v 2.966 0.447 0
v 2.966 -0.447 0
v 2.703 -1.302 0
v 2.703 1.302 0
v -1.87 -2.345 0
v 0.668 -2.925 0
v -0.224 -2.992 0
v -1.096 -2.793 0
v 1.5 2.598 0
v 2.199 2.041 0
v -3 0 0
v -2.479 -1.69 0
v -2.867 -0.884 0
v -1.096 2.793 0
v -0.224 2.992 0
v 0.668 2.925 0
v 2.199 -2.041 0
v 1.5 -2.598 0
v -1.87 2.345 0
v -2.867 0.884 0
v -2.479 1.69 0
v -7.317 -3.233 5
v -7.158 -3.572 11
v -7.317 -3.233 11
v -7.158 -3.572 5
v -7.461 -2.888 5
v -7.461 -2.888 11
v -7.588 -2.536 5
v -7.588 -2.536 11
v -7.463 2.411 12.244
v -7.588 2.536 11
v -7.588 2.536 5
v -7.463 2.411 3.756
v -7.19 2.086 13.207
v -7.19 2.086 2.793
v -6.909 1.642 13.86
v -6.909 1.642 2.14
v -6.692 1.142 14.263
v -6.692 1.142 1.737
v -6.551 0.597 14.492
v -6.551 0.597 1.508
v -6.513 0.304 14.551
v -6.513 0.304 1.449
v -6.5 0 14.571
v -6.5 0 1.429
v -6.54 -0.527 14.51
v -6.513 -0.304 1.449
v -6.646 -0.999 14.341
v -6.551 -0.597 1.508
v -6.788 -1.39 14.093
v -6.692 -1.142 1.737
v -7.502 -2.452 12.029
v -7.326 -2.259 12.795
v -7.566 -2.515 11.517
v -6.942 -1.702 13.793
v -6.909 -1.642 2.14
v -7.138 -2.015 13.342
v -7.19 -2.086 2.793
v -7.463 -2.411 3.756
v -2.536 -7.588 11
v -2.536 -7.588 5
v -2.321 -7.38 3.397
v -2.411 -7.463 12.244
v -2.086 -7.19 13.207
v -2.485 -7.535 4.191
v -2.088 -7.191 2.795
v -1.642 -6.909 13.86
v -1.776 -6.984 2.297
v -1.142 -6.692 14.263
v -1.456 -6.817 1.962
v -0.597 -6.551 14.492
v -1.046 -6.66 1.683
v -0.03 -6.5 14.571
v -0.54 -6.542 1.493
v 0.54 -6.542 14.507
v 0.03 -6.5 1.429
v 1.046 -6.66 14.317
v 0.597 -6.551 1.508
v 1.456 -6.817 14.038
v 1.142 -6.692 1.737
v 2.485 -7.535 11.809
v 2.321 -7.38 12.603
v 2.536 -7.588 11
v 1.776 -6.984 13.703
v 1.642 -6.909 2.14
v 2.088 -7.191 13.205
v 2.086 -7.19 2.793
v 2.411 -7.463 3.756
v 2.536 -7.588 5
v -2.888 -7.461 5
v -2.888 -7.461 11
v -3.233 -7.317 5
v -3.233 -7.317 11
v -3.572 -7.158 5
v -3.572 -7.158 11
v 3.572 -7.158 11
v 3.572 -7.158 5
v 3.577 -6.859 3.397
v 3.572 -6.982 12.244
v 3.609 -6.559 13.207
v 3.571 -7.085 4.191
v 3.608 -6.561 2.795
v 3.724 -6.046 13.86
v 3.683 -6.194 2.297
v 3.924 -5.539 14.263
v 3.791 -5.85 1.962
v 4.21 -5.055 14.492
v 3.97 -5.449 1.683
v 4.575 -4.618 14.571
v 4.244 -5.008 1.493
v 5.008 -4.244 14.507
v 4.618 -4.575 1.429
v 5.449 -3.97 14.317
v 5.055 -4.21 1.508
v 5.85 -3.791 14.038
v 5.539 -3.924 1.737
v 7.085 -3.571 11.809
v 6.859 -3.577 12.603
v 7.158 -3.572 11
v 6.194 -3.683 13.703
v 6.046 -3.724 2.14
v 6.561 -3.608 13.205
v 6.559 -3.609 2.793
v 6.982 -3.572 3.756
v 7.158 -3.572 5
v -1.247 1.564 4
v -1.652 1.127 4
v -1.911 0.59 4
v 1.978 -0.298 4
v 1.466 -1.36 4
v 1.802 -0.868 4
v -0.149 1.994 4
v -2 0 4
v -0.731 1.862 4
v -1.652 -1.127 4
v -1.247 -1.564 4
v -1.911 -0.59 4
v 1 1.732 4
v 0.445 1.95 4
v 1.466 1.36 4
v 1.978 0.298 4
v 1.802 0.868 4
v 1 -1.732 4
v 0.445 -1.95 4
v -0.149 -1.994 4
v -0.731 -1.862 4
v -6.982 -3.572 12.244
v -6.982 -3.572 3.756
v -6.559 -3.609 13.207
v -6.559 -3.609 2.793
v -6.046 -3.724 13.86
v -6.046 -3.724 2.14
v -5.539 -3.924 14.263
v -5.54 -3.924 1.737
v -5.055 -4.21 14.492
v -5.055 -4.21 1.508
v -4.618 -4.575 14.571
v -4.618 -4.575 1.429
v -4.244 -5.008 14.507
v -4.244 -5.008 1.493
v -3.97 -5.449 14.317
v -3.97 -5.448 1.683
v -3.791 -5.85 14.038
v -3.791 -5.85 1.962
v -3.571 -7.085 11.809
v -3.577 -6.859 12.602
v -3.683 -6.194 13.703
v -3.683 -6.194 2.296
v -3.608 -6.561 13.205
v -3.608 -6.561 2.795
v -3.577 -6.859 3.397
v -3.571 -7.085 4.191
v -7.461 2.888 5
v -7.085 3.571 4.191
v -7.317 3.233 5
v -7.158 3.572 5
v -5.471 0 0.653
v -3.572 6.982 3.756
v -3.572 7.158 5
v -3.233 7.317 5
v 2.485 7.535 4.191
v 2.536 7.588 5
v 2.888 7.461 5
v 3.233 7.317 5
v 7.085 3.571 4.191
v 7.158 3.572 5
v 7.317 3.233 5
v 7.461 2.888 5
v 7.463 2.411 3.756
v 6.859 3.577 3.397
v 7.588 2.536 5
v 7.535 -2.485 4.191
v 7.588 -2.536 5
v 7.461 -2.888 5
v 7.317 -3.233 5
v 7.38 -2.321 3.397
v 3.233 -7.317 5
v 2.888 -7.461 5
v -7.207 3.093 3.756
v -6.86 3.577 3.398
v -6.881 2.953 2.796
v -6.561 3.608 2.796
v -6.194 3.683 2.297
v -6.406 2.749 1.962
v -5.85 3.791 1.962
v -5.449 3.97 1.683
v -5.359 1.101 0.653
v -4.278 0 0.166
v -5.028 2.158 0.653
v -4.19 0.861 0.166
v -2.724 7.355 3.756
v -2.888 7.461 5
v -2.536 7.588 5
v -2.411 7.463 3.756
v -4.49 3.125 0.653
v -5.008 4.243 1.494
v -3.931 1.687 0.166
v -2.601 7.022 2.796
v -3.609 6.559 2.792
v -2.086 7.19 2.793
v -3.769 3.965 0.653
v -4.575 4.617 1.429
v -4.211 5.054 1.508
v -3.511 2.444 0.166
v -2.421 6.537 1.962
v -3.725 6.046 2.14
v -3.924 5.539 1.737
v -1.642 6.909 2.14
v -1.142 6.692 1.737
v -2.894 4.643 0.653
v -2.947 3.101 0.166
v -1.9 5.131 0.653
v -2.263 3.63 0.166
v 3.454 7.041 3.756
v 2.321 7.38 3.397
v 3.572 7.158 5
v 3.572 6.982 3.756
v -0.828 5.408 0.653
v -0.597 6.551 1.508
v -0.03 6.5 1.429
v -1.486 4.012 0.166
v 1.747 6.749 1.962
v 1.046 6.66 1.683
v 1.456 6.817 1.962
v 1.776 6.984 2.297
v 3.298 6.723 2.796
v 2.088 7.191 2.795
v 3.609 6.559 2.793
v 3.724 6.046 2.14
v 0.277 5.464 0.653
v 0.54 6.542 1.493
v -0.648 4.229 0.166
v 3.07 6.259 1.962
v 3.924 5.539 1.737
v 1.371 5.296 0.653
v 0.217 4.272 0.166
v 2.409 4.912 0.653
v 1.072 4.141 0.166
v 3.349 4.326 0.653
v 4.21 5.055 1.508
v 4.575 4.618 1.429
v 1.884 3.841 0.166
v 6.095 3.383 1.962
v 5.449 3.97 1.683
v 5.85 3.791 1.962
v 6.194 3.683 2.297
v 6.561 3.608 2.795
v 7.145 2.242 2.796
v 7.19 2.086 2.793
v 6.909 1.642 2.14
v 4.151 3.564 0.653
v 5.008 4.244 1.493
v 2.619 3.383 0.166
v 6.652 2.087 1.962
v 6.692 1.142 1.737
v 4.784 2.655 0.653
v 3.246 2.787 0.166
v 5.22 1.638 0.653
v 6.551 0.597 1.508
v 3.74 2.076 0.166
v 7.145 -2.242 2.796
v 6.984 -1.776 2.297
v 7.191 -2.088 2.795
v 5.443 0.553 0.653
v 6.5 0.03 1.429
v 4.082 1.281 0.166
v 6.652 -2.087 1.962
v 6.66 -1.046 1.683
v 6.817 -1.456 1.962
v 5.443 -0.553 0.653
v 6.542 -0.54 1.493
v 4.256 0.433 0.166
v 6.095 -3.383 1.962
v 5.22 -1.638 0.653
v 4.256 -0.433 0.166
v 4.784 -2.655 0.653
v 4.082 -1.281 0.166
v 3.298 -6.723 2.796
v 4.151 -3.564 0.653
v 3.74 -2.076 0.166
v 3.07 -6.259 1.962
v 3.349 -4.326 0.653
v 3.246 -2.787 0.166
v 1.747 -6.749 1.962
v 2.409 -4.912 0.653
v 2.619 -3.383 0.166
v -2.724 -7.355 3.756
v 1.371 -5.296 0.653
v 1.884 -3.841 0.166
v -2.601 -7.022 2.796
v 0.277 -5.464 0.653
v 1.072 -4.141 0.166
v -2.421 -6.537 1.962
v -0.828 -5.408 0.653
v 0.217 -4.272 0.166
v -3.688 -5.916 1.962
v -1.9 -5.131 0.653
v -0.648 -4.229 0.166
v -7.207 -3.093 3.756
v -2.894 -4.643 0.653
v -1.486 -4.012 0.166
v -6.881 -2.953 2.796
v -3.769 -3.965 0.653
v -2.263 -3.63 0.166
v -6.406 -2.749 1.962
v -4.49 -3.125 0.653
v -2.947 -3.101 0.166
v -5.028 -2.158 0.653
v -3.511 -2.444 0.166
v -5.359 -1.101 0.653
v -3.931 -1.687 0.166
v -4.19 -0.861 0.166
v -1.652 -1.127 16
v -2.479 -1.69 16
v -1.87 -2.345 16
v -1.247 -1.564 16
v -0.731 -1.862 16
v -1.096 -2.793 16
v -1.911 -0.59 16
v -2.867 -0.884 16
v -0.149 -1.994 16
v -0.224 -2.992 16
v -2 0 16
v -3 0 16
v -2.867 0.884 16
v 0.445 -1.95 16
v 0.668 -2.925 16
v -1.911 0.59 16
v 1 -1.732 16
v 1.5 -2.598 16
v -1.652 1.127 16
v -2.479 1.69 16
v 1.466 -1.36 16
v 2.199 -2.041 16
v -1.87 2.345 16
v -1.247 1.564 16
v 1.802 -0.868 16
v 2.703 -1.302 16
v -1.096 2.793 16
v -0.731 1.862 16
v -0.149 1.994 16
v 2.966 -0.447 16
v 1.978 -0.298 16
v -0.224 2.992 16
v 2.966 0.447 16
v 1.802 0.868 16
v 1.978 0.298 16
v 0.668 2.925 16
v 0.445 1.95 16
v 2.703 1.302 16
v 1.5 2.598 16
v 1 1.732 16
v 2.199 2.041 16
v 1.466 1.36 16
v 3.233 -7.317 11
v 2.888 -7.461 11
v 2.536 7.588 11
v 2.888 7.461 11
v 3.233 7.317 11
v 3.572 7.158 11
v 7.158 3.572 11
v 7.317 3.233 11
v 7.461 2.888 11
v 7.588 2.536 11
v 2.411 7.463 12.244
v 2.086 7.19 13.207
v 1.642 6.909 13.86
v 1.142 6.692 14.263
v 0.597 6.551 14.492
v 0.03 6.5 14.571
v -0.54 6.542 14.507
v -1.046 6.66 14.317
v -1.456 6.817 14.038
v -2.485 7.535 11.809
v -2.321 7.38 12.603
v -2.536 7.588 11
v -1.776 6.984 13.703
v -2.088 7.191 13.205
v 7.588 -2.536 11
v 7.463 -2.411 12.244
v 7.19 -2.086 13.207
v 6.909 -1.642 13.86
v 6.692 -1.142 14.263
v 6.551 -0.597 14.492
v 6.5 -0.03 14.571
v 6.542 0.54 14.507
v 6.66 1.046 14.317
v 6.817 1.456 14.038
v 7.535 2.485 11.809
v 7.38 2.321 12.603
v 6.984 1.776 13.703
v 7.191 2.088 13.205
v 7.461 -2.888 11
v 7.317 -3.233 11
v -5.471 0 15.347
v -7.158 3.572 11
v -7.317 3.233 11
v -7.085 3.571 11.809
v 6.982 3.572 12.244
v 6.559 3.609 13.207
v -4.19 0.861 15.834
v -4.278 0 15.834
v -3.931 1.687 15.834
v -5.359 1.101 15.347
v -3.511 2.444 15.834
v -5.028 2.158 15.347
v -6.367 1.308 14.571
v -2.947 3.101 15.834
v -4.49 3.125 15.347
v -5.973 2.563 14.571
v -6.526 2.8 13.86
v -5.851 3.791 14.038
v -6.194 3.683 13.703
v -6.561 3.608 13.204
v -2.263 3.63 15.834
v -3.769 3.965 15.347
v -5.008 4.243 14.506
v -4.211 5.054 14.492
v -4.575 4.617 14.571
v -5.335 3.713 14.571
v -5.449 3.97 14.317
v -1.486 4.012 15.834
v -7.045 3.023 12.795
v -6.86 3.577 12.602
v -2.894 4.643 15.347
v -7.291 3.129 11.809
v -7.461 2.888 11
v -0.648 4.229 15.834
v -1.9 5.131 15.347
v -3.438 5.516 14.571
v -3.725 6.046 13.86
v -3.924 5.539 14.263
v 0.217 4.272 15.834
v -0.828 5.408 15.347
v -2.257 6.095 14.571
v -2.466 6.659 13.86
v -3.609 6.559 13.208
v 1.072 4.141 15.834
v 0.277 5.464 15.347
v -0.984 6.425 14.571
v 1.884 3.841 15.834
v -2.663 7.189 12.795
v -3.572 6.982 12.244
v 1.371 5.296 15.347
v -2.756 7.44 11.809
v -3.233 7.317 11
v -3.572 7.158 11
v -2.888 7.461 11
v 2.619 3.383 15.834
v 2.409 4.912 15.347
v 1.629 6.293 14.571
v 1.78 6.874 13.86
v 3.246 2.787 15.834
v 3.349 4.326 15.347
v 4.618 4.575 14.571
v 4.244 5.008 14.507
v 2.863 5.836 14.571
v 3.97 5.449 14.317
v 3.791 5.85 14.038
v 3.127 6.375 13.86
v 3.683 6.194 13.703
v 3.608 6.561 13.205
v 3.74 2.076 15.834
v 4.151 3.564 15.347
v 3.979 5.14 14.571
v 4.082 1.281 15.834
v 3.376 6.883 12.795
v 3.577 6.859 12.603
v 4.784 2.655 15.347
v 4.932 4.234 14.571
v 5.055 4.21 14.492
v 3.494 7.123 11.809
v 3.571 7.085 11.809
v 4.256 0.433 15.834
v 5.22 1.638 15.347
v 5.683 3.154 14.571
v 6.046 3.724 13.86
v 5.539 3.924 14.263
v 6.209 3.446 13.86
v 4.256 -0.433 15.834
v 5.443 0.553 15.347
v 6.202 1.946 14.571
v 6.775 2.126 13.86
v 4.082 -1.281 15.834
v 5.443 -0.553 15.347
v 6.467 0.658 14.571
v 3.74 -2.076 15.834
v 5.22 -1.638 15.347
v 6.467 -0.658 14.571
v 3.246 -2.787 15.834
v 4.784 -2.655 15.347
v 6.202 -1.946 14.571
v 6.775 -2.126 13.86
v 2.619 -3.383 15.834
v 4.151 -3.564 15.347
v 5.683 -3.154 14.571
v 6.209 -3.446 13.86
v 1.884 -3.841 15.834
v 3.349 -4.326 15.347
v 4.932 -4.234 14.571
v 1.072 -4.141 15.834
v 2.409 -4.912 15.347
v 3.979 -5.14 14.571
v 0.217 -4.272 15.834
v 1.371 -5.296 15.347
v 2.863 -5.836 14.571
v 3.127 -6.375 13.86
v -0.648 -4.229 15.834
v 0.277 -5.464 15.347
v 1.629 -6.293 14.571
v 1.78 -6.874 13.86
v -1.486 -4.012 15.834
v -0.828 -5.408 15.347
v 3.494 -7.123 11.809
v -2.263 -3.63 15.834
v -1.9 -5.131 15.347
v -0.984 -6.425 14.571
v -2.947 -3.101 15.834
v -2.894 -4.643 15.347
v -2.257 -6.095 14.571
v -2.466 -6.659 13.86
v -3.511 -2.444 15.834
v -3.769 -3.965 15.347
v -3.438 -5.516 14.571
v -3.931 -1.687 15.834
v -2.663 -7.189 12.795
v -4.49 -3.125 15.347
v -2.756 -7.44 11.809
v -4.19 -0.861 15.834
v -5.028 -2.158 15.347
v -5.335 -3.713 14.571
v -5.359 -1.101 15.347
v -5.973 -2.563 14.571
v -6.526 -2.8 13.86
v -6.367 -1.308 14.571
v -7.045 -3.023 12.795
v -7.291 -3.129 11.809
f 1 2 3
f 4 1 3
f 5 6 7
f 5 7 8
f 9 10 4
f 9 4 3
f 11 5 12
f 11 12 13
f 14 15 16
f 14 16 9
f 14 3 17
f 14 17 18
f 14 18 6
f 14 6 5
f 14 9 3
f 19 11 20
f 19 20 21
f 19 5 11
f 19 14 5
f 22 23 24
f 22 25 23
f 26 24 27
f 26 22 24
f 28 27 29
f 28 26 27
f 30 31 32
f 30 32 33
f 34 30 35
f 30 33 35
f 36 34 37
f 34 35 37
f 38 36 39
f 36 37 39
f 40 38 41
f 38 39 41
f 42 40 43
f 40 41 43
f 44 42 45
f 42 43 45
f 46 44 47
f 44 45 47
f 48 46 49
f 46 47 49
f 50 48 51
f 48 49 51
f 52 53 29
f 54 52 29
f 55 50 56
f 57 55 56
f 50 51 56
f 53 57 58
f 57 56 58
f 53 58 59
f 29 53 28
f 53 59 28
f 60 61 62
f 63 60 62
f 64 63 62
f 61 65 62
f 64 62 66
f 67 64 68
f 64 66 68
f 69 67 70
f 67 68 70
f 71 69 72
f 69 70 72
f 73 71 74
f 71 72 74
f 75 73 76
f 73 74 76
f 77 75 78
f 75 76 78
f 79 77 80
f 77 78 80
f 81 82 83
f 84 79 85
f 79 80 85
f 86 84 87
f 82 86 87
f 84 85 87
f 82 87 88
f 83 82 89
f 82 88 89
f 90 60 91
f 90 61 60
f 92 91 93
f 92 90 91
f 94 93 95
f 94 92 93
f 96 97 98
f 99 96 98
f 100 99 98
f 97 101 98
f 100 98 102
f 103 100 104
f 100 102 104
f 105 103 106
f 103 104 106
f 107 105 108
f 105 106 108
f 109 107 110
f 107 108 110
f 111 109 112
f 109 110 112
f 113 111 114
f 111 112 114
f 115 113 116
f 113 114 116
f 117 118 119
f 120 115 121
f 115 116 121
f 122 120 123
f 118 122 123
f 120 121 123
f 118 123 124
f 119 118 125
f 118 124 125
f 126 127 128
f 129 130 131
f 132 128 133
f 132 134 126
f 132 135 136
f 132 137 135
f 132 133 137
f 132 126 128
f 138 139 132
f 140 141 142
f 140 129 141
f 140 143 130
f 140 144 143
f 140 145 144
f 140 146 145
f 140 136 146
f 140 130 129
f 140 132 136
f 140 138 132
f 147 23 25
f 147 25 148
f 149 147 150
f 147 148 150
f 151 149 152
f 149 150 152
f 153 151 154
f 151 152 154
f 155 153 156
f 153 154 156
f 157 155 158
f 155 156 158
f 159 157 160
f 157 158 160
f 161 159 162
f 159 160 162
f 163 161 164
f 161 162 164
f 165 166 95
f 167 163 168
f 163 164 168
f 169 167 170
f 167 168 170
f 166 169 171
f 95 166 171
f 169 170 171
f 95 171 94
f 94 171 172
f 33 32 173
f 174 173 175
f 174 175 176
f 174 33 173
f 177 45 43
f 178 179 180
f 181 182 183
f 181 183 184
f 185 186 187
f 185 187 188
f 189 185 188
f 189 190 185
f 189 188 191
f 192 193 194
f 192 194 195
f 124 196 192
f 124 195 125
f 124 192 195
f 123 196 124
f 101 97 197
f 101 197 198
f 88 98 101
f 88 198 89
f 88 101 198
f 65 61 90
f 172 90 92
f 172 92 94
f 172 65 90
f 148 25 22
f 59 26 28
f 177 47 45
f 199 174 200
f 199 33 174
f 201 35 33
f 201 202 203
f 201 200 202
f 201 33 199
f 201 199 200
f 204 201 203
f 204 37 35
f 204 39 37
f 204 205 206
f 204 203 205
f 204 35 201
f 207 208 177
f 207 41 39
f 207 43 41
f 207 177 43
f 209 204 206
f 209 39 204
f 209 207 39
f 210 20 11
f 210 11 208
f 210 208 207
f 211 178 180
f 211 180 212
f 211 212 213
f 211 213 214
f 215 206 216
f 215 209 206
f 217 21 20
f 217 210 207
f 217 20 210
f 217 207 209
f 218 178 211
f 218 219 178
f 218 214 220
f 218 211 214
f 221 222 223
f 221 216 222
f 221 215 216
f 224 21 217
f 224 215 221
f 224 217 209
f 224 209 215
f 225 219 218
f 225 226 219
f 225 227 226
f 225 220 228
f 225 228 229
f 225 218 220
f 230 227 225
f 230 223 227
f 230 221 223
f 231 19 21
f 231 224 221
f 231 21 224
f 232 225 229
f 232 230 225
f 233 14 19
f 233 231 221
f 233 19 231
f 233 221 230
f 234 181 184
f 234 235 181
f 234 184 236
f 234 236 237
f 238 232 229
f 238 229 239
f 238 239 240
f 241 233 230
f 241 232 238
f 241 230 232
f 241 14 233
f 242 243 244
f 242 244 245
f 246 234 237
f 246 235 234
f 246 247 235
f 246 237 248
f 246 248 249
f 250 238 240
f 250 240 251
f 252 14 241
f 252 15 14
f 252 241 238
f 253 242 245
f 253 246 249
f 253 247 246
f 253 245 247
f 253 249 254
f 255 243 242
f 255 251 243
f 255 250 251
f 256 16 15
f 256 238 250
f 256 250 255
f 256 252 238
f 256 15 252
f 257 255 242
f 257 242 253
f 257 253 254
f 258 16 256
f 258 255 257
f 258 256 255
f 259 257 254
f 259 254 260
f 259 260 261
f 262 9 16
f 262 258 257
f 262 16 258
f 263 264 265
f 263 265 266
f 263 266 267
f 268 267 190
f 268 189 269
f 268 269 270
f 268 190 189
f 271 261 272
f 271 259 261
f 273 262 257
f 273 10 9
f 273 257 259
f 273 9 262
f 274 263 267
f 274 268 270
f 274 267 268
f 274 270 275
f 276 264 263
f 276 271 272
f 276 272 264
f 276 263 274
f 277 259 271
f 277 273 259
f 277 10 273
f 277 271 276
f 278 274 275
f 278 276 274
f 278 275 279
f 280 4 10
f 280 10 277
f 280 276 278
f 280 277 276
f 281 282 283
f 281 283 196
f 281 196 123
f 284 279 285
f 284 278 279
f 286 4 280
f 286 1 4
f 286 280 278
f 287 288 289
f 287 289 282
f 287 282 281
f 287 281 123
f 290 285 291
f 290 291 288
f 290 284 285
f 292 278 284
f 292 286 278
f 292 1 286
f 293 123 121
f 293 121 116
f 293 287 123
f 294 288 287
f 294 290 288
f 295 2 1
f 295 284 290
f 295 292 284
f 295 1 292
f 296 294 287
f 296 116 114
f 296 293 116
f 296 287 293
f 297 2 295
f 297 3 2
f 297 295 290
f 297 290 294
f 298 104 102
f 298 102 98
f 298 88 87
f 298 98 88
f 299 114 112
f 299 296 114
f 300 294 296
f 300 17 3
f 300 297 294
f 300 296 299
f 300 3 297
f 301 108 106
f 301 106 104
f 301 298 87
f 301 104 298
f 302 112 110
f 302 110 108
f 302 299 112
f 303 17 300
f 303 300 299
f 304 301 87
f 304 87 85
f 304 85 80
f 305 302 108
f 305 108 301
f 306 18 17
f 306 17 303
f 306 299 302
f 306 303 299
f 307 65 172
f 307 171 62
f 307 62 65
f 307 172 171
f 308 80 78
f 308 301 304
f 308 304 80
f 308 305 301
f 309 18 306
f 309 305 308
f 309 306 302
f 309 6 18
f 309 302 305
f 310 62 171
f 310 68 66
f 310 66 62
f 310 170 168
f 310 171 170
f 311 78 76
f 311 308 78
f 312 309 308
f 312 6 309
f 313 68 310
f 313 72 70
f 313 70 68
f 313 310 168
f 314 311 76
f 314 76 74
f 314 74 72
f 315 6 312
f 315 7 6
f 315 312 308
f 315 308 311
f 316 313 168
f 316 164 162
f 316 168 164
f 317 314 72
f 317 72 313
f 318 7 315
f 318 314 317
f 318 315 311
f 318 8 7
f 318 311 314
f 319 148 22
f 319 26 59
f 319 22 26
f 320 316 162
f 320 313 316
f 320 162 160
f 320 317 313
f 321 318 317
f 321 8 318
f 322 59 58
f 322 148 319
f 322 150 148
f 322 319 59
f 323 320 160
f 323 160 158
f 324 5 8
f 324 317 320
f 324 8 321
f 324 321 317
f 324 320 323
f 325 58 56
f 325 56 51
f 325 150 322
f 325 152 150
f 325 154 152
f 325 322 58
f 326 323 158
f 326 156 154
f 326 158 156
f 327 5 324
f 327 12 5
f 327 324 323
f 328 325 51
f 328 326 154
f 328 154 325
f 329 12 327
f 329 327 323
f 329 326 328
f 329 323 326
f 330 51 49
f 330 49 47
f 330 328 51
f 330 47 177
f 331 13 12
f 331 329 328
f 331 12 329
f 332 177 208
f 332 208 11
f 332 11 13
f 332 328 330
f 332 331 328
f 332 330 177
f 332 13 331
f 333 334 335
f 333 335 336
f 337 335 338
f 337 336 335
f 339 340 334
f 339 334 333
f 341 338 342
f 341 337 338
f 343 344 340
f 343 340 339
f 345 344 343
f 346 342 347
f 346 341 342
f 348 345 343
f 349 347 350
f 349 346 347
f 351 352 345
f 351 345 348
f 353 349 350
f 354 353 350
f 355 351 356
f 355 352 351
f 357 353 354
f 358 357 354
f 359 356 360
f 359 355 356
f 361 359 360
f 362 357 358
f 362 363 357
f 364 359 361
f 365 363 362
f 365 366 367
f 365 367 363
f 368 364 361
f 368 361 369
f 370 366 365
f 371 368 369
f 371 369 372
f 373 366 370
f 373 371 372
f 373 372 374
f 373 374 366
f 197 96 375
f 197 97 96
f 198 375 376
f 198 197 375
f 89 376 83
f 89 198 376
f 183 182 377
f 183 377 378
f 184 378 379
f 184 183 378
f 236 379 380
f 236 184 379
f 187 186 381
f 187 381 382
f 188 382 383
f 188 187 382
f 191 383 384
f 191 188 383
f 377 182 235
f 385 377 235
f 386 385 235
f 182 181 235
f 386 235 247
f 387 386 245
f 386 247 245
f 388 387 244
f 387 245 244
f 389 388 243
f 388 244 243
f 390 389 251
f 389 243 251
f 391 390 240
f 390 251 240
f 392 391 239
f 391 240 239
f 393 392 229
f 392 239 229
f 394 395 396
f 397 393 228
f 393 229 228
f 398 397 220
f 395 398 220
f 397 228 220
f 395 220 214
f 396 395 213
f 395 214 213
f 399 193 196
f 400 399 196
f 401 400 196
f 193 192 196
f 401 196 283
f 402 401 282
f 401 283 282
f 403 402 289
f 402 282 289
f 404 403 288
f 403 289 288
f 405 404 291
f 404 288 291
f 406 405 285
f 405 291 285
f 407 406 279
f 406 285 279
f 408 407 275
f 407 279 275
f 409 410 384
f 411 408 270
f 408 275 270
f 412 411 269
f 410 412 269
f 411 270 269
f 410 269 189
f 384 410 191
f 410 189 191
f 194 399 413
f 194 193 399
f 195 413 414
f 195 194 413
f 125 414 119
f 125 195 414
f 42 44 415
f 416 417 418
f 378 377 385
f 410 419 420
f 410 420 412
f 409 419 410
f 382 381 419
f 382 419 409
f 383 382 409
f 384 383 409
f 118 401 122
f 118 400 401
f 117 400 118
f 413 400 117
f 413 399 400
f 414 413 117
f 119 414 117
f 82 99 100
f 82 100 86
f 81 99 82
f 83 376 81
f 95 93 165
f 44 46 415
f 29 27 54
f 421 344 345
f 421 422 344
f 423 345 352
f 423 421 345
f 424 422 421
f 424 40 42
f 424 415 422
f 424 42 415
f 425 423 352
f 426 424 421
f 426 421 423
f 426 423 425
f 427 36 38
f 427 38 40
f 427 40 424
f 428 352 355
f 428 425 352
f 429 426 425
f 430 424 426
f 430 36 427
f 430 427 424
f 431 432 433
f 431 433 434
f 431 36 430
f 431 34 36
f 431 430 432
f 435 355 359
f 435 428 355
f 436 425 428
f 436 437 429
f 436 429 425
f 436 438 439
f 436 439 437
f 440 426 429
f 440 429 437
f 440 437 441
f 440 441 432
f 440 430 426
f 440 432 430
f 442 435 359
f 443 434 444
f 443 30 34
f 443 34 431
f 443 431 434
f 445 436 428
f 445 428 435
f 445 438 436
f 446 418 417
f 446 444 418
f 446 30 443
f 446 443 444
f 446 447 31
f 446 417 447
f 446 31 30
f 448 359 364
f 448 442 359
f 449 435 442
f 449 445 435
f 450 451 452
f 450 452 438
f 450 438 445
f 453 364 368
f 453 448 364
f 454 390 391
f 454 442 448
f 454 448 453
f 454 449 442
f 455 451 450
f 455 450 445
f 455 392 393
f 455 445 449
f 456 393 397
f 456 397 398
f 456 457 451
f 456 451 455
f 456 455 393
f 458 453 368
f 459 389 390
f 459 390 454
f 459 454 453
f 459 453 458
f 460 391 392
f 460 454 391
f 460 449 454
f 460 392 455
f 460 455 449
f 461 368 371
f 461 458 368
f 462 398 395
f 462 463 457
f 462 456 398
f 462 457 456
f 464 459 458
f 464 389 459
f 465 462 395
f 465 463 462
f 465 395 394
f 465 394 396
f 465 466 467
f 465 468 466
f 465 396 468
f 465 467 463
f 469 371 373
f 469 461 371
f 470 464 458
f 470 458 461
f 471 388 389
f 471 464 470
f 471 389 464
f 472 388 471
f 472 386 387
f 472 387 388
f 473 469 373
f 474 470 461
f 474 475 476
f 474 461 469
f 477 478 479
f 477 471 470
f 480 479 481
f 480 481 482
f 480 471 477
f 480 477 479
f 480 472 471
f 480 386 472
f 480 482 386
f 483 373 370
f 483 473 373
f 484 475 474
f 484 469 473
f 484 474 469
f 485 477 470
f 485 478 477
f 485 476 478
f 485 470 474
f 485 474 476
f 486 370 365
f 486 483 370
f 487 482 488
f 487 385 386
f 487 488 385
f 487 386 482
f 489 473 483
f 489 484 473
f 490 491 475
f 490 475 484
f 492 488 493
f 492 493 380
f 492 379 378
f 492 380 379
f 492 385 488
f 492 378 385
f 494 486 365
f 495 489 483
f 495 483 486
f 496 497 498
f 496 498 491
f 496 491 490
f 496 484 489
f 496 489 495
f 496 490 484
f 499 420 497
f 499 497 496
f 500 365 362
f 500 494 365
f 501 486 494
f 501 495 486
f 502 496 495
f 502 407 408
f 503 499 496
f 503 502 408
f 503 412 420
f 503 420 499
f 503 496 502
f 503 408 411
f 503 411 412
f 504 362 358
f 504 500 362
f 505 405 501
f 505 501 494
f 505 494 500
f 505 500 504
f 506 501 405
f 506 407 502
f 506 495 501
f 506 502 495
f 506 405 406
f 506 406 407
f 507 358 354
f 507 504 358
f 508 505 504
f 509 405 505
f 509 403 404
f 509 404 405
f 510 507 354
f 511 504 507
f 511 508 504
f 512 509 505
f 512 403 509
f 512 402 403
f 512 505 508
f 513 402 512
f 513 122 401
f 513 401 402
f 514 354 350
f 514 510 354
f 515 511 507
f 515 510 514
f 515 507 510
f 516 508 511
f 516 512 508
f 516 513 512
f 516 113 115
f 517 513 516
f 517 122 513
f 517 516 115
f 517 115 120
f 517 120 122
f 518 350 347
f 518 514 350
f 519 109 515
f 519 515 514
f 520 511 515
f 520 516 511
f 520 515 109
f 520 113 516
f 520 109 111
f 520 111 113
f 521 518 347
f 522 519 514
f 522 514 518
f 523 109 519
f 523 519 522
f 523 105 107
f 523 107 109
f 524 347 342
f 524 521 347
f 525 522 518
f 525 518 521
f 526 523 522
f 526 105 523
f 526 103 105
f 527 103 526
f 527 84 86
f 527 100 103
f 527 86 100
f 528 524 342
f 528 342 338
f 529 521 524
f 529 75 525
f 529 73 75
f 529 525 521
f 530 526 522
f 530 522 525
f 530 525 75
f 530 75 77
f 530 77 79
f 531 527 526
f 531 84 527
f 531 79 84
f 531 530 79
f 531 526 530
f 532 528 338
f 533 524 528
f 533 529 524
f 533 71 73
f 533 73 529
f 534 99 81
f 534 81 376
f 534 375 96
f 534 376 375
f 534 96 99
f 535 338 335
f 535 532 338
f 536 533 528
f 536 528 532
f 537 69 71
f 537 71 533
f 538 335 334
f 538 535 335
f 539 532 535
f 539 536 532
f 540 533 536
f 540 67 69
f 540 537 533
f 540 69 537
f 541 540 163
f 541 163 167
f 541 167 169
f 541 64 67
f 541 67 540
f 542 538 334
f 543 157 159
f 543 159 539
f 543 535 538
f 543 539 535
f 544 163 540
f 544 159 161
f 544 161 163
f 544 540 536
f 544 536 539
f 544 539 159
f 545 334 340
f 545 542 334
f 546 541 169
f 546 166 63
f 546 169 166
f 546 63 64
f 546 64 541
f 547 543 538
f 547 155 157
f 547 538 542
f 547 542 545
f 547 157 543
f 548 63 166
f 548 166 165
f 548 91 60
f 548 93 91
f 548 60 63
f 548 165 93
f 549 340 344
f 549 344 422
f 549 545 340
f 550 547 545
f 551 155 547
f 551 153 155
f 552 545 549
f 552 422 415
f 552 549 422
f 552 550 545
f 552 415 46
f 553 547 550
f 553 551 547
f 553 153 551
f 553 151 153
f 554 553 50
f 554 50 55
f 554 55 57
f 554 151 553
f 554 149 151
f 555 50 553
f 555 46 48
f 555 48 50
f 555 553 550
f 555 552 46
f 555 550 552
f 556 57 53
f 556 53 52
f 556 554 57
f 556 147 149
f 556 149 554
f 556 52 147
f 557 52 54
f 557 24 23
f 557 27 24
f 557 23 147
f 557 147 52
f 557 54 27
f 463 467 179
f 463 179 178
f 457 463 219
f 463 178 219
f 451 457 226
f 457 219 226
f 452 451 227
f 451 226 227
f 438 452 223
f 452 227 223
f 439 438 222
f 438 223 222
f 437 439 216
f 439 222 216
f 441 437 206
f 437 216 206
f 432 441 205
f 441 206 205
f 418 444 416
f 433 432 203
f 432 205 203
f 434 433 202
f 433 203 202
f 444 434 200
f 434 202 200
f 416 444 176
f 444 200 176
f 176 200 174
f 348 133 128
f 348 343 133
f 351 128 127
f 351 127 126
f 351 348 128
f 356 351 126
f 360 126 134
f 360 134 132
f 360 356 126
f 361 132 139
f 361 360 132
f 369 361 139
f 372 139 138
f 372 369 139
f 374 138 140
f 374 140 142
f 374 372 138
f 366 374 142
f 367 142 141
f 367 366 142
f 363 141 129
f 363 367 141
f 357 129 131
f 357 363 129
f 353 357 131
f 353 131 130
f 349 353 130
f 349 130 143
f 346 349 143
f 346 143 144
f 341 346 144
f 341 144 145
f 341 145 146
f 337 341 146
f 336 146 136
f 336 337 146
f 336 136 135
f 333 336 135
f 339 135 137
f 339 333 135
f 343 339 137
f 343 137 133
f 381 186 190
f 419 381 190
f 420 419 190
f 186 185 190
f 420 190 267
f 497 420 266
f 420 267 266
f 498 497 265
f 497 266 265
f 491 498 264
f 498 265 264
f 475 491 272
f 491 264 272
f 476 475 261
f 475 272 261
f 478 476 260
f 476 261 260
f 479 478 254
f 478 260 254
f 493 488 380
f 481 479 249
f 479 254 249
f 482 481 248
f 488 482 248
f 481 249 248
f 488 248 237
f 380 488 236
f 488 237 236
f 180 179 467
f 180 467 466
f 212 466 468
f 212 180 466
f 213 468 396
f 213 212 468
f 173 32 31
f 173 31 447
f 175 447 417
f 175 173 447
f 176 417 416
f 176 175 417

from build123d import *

# Parameters (mm, degrees)
F2_R     = 5
F3_R     = 3.5
F4_DEPTH = 25


# Not quite as in the source:
# - a feature names something its author has since deleted; it is built from what else it names


with BuildPart() as f1:
    # F0 (on Front) → F1 (revolve)
    with BuildSketch(Plane.XZ):
        Polygon((-2, 4), (-2, 16), (-8, 16), (-8, 6), (-8, 0), (0, 0), (0, 4), align=None)
    revolve(axis=Axis((0, 0, 2), (0, 0, -1)))

    # F2
    f2_edges = [f1.edges().sort_by_distance(p)[0] for p in [
        (8, 0, 0),
        (8, 0, 16),
    ]]
    fillet(f2_edges, radius=F2_R)

    # F3 (on face) → F4 (cut)
    with BuildSketch(Plane(origin=(0, 0, 0), x_dir=(1, 0, 0), z_dir=(0, 0, -1))):
        with Locations((0, 10)):
            Circle(F3_R)
        with Locations((7.0710678119, 7.0710678119)):
            Circle(F3_R)
        with Locations((10, 0)):
            Circle(F3_R)
        with Locations((7.0710678119, -7.0710678119)):
            Circle(F3_R)
        with Locations((0, -10)):
            Circle(F3_R)
        with Locations((-7.0710678119, -7.0710678119)):
            Circle(F3_R)
        with Locations((-10, 0)):
            Circle(F3_R)
        with Locations((-7.0710678119, 7.0710678119)):
            Circle(F3_R)
    extrude(amount=-F4_DEPTH, mode=Mode.SUBTRACT)


solid = f1.part
